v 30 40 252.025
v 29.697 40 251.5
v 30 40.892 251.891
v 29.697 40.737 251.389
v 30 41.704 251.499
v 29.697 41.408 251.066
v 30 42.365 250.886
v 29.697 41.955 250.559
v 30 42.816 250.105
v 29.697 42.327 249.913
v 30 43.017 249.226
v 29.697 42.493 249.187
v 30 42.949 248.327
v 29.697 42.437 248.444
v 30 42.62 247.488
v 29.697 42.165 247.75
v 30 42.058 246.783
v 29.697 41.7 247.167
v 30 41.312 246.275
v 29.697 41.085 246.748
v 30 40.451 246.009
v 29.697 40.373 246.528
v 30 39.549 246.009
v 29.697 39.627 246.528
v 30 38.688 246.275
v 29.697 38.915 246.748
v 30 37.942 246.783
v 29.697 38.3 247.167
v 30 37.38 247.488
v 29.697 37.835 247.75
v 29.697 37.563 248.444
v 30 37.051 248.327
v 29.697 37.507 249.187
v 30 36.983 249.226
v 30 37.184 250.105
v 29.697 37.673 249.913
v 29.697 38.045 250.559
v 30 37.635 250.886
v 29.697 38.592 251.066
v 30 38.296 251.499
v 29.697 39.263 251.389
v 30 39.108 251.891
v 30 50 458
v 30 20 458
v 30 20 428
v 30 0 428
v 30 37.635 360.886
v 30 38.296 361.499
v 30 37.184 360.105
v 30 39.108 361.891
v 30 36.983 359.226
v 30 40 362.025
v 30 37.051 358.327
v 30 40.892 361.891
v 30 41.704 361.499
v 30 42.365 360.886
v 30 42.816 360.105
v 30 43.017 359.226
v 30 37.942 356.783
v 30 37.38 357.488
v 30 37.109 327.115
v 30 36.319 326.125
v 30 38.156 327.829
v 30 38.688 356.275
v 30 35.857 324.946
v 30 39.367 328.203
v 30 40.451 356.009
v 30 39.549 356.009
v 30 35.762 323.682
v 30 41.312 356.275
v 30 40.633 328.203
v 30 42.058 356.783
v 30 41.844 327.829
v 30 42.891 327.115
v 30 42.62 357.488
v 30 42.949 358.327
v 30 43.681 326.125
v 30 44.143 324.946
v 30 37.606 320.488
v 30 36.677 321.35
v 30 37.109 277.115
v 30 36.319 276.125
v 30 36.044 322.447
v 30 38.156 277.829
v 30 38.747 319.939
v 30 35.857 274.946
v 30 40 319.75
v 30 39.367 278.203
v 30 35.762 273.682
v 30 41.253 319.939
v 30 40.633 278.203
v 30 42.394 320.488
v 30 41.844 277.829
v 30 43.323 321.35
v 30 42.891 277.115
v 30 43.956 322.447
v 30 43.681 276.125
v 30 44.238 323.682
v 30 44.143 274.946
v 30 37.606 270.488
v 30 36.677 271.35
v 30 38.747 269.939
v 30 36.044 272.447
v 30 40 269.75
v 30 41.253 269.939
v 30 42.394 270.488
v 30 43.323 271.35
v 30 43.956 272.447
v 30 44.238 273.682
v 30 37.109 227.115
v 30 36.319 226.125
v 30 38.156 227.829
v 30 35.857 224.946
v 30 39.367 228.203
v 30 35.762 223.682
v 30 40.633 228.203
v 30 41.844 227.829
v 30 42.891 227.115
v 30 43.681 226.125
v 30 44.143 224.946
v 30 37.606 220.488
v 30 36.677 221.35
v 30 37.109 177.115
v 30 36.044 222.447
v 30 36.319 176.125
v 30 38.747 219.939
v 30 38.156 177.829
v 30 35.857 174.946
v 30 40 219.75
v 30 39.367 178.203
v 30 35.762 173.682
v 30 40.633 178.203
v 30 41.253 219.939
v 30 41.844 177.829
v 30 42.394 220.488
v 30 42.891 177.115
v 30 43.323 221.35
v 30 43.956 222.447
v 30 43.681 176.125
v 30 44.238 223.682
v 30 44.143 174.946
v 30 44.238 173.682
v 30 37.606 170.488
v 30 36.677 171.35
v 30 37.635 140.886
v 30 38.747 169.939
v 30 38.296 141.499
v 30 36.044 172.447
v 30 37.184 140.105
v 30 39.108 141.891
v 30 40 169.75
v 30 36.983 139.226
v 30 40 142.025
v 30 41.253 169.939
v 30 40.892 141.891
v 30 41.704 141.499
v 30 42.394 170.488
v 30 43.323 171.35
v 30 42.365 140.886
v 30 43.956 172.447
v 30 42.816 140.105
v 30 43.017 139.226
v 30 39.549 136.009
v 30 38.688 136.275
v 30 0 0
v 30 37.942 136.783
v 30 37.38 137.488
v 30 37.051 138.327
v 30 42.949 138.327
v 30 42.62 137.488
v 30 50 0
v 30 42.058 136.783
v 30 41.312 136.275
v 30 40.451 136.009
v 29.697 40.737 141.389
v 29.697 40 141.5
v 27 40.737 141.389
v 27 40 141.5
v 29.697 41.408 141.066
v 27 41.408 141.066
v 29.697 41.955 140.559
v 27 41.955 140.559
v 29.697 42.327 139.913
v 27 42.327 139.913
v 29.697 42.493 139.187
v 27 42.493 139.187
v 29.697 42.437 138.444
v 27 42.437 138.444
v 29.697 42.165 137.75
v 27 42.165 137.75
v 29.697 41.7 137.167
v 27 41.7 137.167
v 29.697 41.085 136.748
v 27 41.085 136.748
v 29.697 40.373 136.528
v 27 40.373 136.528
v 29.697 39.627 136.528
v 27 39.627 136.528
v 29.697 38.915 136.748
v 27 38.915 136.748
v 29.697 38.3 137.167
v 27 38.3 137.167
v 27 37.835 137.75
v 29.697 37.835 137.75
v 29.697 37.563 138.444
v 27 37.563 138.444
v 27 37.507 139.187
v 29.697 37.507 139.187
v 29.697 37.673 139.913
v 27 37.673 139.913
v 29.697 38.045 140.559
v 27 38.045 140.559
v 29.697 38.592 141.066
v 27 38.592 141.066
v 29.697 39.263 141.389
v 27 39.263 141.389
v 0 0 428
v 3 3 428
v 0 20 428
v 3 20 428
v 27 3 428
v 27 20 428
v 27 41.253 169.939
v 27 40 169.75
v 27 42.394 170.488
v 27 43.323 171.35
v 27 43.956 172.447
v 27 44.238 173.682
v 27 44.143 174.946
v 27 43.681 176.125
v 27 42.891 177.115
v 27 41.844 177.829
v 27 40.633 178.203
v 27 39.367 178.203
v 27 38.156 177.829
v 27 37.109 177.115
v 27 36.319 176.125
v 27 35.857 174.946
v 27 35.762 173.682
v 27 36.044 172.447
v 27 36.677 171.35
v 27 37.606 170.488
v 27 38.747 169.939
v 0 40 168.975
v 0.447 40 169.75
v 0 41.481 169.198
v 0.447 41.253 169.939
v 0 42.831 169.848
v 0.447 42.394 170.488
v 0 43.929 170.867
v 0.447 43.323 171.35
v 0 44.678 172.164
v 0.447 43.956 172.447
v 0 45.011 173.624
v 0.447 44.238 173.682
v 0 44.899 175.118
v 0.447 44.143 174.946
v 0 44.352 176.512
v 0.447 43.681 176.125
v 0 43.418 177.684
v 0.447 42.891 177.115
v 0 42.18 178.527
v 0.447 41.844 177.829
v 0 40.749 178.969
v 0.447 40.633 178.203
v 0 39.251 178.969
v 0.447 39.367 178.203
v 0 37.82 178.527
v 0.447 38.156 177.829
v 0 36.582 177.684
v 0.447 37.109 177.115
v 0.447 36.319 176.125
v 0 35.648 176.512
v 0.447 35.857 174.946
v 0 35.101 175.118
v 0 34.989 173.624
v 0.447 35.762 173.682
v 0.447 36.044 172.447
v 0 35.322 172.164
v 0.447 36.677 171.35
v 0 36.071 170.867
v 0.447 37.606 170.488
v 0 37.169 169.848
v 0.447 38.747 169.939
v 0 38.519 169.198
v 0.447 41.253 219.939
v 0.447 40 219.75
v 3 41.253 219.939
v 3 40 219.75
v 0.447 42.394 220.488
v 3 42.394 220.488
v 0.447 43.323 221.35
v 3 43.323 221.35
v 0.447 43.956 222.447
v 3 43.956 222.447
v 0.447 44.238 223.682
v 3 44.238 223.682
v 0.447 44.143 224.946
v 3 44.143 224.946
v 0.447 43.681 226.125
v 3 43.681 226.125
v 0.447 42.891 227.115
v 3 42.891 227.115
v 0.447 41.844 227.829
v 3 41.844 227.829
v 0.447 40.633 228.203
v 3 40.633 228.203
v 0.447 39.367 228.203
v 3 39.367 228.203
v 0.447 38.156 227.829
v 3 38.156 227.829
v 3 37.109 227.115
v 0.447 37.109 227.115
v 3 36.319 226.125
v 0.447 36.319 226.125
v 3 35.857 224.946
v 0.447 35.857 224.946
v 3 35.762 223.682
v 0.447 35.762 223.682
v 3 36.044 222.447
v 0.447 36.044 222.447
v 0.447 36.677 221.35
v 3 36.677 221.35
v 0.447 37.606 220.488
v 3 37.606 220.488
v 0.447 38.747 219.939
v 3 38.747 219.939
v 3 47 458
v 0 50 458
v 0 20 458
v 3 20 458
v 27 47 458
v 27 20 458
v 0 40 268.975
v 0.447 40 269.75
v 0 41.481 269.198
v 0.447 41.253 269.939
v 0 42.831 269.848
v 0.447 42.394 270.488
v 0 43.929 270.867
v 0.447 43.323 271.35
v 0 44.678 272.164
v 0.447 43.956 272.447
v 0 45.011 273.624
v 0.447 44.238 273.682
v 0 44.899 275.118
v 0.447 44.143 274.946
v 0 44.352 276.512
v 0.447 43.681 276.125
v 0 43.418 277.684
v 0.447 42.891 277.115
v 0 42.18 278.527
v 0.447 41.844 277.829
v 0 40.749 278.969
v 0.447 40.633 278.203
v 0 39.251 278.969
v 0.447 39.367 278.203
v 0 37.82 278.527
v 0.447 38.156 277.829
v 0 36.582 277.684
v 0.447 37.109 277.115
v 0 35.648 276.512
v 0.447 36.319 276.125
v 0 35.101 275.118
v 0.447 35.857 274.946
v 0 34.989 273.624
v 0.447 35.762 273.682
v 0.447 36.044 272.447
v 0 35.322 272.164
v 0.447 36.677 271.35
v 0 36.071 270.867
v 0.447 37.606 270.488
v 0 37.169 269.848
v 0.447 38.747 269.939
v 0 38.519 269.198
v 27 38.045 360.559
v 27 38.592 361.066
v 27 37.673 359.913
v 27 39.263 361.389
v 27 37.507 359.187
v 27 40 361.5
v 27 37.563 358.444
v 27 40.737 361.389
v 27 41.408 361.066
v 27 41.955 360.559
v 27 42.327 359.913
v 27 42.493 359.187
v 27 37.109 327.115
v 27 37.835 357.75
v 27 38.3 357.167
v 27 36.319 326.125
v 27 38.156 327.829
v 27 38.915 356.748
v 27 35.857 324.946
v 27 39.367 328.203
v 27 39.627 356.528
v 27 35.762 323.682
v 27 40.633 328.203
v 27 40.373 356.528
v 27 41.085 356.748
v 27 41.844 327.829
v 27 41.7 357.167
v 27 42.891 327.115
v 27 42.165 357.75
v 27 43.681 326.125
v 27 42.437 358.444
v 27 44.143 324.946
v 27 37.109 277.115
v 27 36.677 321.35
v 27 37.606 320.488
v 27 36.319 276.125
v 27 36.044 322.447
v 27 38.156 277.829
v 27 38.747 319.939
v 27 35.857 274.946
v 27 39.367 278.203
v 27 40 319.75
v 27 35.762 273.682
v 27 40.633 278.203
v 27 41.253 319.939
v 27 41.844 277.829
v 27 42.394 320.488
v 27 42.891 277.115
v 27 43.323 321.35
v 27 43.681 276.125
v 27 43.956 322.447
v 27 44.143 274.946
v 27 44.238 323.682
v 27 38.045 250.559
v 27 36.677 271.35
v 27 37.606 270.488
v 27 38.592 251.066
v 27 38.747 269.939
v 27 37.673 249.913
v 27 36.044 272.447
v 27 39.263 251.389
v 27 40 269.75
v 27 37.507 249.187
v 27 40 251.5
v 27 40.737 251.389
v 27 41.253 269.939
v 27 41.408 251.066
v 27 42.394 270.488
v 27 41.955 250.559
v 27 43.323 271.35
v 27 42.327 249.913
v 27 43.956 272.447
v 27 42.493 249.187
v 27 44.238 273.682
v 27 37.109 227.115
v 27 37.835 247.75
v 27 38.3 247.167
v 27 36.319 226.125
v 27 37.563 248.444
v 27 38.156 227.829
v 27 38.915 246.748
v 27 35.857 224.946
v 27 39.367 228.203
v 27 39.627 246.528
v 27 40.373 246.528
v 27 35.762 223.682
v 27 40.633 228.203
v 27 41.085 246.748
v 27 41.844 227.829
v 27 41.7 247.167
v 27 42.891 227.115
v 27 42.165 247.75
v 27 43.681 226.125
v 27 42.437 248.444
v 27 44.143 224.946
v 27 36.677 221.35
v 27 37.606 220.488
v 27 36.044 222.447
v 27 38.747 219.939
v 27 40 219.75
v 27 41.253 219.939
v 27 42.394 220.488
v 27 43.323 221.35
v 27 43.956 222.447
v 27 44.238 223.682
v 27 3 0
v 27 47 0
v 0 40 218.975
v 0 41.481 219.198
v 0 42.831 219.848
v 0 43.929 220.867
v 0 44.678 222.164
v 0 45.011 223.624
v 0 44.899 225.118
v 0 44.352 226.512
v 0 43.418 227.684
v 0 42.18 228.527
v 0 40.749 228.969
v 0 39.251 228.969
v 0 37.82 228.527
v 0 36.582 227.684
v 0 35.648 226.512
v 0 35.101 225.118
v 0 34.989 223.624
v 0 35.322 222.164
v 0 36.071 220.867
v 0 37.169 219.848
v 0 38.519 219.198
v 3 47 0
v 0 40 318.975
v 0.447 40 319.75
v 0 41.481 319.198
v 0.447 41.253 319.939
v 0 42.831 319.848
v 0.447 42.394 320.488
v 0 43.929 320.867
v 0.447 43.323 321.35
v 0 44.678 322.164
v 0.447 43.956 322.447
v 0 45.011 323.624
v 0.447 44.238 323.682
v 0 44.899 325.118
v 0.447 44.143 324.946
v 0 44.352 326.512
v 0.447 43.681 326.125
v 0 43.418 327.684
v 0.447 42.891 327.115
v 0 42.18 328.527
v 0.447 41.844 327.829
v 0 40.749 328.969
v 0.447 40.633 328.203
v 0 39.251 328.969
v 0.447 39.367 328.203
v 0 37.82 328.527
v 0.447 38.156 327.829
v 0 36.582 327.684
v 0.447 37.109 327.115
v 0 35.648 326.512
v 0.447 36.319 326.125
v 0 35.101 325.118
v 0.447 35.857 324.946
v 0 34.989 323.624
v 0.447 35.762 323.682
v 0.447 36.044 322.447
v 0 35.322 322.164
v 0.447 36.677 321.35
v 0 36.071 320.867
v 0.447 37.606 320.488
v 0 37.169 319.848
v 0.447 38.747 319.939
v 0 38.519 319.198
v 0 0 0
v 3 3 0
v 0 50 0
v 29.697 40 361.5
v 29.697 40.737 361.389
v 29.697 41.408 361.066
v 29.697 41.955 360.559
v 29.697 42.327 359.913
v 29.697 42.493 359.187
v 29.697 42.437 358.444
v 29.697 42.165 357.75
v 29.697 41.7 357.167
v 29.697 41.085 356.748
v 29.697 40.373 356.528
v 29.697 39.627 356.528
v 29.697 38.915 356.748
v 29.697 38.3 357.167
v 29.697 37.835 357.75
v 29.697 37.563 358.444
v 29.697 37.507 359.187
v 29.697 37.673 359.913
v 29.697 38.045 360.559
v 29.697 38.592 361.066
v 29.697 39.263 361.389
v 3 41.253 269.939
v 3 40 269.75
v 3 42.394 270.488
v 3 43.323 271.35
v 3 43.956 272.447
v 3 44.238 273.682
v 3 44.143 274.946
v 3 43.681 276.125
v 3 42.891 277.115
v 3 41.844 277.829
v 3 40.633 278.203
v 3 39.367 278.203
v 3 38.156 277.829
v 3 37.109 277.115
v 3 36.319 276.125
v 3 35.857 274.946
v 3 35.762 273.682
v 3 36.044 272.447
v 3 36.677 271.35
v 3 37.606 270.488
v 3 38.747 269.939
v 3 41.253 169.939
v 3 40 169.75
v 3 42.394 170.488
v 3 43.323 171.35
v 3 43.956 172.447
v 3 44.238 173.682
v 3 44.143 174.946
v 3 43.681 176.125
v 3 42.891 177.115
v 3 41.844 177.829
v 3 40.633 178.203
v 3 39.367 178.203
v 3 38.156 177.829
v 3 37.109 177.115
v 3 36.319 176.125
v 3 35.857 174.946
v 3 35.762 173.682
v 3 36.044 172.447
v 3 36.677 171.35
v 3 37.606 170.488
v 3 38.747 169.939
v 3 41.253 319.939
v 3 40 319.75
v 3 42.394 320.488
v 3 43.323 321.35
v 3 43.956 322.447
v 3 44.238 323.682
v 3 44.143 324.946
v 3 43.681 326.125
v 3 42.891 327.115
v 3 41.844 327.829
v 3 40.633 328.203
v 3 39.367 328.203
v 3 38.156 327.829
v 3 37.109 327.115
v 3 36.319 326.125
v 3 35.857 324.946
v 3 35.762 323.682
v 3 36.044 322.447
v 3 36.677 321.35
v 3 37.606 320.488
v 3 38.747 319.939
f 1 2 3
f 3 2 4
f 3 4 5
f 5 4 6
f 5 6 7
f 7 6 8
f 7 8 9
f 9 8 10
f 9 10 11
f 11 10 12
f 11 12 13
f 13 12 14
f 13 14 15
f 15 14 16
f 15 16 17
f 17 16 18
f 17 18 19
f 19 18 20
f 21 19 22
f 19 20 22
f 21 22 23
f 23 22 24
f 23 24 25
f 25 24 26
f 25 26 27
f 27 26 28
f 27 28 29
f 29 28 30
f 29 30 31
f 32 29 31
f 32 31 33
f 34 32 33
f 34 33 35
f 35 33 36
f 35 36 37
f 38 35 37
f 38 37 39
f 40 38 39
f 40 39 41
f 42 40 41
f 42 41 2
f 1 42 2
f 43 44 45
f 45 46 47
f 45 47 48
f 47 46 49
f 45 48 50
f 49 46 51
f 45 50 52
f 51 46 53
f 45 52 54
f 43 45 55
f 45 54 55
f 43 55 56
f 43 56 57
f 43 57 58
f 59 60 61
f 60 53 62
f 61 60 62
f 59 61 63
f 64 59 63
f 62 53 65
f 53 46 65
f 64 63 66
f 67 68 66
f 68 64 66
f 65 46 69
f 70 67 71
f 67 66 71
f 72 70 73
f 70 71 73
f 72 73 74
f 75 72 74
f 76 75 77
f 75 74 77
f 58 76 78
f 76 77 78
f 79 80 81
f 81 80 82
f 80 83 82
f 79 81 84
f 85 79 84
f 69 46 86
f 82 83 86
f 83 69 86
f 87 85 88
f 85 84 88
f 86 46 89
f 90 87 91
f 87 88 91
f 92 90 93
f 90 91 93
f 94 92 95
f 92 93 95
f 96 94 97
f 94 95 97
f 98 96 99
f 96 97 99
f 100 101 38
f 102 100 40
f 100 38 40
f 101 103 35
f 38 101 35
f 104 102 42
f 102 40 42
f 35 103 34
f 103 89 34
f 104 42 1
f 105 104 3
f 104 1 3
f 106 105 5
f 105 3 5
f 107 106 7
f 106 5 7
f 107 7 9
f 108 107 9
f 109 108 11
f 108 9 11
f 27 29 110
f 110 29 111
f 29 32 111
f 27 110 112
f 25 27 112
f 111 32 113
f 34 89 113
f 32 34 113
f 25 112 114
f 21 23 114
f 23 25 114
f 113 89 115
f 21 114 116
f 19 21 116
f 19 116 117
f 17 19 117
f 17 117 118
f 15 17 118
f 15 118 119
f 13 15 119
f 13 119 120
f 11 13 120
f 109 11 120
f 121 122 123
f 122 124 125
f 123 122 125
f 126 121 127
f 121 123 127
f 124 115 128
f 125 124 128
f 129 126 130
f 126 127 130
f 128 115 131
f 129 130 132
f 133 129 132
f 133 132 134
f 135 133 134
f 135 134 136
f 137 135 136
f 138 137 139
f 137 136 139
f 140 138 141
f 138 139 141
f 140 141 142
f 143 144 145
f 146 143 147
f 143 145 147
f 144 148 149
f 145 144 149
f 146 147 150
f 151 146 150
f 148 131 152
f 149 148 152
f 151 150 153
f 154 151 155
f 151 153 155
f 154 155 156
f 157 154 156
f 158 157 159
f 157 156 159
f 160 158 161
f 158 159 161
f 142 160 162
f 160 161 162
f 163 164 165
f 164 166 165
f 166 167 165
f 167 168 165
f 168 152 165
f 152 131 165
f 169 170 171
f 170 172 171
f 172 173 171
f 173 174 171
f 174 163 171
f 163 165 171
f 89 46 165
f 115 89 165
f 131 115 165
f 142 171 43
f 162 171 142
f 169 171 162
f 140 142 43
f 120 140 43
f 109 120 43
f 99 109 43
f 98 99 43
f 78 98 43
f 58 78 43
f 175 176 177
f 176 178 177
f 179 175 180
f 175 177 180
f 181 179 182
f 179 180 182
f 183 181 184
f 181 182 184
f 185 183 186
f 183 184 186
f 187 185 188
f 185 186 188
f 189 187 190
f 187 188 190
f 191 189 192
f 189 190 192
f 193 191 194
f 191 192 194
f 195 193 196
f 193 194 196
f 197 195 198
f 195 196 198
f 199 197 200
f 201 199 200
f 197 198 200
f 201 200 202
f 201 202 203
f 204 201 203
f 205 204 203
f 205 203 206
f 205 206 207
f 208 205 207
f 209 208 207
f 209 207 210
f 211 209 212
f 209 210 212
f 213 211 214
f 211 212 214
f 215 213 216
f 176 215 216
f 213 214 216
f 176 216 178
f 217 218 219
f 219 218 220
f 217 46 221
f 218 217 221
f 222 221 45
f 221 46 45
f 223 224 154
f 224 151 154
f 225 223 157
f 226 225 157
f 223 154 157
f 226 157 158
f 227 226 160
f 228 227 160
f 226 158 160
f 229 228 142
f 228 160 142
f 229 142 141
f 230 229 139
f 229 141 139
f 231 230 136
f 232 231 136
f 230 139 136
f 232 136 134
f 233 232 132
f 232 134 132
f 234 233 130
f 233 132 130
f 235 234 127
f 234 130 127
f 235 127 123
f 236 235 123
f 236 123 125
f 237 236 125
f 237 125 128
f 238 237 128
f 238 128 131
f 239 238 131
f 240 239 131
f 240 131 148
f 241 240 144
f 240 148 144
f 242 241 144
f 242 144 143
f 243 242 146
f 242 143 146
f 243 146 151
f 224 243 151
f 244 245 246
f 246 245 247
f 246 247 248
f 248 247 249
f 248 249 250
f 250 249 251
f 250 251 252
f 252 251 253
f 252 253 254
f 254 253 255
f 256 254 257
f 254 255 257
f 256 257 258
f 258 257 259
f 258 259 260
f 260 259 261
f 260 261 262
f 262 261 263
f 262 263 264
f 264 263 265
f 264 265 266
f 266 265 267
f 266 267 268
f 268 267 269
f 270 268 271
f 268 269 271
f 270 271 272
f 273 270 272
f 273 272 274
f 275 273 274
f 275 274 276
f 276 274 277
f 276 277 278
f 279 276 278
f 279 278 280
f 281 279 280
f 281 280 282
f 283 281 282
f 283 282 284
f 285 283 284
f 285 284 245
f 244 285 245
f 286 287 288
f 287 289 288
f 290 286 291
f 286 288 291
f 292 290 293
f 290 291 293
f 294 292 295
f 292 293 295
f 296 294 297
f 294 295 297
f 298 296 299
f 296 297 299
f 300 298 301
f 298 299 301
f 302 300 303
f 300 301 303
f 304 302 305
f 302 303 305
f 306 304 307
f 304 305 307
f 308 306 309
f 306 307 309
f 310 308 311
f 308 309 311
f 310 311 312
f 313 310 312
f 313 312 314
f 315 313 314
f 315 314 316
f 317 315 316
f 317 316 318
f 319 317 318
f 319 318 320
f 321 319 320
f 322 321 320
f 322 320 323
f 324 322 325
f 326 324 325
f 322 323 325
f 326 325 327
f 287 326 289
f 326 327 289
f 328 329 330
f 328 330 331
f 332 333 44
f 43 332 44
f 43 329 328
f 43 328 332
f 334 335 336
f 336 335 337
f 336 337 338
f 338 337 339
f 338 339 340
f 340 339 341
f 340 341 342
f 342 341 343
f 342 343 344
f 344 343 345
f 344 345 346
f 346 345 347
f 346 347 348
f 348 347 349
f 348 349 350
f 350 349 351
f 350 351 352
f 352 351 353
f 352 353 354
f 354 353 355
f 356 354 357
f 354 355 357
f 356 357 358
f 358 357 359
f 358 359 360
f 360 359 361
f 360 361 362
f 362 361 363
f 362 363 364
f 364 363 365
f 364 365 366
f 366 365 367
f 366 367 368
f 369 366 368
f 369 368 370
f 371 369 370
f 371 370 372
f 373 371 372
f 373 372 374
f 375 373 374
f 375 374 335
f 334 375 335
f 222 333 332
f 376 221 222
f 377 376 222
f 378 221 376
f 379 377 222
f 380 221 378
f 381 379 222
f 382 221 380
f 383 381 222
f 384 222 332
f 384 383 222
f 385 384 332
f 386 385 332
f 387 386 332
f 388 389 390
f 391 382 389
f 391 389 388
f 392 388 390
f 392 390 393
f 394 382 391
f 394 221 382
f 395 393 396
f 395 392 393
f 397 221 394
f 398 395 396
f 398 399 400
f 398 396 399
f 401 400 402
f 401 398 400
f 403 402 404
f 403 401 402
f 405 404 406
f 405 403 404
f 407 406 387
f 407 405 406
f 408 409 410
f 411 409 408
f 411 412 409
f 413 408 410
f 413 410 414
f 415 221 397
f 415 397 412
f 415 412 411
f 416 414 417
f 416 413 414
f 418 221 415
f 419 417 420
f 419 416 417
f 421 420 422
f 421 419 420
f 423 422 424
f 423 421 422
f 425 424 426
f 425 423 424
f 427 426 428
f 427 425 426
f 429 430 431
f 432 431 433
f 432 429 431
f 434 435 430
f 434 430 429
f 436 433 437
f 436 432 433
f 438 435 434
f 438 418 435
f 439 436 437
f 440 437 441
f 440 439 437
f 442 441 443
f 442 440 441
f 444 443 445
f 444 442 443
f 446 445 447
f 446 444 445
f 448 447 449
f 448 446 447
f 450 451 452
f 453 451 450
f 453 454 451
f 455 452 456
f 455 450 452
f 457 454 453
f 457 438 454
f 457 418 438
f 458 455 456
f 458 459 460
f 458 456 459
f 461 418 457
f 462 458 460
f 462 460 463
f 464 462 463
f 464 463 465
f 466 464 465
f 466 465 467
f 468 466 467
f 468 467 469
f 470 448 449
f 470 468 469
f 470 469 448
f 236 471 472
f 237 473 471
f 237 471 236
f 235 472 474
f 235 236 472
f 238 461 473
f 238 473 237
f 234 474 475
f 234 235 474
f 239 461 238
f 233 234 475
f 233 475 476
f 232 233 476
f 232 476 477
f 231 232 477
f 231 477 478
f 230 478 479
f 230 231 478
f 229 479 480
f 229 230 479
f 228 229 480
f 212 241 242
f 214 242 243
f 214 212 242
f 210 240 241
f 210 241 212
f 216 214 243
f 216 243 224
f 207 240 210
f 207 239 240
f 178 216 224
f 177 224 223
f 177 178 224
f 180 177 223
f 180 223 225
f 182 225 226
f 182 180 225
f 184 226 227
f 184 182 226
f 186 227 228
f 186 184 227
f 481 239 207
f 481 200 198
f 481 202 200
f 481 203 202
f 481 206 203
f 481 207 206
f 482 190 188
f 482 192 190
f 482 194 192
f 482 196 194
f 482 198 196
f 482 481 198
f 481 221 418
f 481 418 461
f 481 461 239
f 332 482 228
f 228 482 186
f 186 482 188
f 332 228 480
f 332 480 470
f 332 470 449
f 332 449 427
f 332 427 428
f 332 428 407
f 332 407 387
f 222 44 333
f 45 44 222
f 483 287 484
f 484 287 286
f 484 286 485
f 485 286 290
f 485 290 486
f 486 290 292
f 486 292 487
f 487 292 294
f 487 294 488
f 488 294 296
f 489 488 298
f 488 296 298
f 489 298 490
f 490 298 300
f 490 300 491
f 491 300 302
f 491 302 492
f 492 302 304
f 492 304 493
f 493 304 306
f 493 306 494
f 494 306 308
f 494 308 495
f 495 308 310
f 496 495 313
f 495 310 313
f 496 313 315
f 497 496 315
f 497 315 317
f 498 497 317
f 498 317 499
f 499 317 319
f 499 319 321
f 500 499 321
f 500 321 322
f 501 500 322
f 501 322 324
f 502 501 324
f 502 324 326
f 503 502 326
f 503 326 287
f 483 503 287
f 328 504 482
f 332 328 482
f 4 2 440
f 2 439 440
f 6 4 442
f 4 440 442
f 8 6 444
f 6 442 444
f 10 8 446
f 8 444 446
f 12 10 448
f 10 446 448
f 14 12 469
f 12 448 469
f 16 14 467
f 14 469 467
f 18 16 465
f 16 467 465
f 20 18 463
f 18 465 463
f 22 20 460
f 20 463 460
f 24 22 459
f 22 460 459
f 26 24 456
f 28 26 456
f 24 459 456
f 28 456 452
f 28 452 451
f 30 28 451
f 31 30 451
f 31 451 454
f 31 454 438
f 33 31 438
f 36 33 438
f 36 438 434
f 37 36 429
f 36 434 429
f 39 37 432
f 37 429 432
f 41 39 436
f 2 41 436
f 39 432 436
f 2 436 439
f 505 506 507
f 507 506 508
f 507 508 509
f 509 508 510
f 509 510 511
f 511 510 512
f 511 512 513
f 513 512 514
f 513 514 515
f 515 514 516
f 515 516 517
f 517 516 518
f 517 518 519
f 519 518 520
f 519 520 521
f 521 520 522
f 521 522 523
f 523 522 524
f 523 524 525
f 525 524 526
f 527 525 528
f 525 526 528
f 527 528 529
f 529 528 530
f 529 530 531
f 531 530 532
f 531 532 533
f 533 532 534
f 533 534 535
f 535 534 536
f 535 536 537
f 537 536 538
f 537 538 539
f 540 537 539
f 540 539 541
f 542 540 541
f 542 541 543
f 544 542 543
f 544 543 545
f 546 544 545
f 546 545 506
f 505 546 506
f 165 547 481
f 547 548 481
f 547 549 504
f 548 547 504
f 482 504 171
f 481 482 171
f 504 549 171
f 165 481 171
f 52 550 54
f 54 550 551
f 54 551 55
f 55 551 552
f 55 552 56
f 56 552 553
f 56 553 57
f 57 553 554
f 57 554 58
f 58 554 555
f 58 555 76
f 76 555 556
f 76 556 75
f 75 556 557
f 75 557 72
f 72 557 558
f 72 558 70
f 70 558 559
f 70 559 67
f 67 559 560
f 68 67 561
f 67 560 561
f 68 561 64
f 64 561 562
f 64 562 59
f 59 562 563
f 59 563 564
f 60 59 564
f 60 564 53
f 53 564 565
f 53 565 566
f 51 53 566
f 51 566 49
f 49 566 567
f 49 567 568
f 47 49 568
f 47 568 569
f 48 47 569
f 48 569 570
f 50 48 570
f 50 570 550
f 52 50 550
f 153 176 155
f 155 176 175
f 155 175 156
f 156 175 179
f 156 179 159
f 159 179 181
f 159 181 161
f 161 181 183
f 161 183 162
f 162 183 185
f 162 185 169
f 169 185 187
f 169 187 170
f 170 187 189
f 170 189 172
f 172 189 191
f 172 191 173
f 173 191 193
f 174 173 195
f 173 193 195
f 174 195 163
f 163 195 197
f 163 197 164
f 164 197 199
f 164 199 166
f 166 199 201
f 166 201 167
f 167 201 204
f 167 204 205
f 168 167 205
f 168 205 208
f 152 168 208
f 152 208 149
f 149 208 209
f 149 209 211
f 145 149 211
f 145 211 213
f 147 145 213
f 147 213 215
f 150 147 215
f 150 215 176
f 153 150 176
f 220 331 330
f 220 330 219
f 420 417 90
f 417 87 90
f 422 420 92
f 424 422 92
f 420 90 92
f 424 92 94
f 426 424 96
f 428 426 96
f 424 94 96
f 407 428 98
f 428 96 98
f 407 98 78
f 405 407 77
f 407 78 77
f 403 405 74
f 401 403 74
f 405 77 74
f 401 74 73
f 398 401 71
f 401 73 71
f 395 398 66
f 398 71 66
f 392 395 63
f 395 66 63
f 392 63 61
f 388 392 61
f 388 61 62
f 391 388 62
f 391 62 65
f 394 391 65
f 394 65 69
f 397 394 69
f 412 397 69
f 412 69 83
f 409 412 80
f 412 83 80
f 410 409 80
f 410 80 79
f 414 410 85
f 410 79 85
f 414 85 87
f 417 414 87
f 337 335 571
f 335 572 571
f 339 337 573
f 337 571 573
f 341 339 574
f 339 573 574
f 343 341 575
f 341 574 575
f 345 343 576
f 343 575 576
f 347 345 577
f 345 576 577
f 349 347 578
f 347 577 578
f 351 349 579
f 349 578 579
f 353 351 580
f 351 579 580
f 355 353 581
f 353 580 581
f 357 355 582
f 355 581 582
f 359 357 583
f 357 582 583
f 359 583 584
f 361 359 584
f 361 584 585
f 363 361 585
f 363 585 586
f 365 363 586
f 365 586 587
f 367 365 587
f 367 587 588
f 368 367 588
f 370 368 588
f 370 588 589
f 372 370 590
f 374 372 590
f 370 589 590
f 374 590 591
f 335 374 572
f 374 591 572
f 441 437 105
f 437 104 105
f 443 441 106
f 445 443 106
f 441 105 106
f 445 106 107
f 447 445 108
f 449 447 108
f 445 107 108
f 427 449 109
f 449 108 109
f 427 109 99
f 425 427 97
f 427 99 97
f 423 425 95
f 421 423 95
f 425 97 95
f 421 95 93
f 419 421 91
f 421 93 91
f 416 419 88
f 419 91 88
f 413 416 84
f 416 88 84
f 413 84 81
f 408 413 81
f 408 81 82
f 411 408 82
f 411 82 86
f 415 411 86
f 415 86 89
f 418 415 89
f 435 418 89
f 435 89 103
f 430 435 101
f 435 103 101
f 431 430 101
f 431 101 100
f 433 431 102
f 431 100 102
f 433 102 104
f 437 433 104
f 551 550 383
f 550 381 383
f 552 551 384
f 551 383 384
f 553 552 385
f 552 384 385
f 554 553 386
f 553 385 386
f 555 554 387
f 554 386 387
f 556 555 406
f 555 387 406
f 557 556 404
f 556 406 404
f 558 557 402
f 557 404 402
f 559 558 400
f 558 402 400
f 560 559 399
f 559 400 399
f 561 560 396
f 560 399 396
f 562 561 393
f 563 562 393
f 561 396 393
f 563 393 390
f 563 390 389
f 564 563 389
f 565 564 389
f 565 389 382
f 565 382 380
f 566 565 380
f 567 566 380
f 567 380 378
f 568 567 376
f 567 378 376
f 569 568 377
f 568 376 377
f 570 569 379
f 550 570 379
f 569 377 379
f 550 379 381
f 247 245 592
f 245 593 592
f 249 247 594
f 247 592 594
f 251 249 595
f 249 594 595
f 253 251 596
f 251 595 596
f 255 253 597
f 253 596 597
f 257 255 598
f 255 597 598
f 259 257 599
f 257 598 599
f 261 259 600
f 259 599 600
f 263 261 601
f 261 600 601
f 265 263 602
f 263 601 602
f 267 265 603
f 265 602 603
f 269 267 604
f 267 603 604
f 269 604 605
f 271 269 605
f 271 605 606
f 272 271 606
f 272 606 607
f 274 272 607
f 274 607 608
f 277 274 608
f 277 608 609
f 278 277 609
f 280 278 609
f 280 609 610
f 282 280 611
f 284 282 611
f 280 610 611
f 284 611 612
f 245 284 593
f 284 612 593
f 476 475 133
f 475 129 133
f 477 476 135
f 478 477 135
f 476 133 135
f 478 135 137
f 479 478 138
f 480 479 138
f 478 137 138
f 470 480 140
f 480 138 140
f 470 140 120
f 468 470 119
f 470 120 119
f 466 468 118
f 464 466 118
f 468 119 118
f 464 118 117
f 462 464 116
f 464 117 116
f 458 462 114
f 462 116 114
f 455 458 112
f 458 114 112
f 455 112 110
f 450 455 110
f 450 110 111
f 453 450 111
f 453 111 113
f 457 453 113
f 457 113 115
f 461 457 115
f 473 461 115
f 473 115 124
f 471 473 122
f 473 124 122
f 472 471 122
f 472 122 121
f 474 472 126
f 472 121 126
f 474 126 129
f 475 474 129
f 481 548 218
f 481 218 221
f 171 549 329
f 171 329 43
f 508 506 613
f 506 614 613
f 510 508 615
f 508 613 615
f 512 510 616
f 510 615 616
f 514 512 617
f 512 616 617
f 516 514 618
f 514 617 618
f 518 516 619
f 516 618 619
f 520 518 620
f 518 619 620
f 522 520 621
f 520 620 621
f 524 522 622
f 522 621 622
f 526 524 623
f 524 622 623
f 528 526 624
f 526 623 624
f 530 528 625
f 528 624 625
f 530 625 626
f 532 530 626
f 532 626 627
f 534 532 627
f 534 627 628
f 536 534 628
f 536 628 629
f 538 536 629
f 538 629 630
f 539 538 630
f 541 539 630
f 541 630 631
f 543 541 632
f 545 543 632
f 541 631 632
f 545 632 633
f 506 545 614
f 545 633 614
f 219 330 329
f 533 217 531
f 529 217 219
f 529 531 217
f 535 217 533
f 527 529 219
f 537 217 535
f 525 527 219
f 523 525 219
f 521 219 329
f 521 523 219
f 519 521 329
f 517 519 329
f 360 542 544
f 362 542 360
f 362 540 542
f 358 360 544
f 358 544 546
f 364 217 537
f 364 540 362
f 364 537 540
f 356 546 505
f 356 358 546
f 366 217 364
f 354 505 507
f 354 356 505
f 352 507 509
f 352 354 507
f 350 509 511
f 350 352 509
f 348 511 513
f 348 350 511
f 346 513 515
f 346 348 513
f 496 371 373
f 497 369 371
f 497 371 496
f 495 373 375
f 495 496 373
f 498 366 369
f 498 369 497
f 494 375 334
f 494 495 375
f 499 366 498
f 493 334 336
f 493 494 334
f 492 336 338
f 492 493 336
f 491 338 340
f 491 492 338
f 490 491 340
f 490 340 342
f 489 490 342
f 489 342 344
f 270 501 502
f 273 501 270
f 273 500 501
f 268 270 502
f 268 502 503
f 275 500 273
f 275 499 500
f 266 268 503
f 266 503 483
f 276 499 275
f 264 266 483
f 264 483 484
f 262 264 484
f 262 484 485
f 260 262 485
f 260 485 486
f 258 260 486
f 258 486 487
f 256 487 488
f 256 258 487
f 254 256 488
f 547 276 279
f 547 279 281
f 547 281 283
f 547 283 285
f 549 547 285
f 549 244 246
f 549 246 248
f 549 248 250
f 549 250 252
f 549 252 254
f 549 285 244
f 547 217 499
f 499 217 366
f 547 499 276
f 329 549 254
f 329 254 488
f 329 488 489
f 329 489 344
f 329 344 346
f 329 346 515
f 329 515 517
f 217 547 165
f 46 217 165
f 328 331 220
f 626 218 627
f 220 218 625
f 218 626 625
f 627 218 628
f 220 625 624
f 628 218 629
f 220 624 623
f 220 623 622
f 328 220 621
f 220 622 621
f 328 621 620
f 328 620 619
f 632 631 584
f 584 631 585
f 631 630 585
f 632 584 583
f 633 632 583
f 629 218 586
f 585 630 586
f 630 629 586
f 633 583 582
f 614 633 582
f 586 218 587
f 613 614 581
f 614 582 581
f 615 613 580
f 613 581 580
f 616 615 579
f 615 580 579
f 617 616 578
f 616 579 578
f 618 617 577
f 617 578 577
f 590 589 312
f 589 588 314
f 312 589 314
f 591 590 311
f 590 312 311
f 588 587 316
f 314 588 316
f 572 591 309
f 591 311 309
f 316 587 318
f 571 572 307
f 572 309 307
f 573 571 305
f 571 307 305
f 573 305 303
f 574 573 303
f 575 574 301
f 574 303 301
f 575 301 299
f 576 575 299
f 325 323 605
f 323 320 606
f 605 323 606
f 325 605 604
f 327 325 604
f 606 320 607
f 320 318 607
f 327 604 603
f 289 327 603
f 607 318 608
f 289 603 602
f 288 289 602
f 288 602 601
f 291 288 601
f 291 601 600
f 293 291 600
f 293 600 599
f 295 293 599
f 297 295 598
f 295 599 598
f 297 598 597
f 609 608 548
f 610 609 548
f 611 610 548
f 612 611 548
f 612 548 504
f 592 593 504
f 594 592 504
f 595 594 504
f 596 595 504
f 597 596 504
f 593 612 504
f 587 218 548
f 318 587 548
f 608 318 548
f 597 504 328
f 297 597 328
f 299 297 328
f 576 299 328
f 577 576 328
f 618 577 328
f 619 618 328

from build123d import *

# Parameters (mm, degrees)
SKETCH_1_W                   = 30
SKETCH_1_H                   = 50
SKETCH_1_W_2                 = 24
SKETCH_1_H_2                 = 44
EXTRUDE_1_DEPTH              = 458
SKETCH_2_W                   = 30
SKETCH_2_H                   = 20
CUT_EXTRUDE_1_DEPTH          = 462.696870251
HOLE_WIZARD_M61_D            = 5
HOLE_WIZARD_M61_DEPTH        = 17
HOLE_WIZARD_M61_CSINK_D      = 6.05
HOLE_WIZARD_M61_CSINK_ANGLE  = 120
HOLE_WIZARD_M61_TIP          = 1.502151548
HOLE_WIZARD_M101_D           = 8.5
HOLE_WIZARD_M101_DEPTH       = 47.5
HOLE_WIZARD_M101_CSINK_D     = 10.05
HOLE_WIZARD_M101_CSINK_ANGLE = 120
HOLE_WIZARD_M101_TIP         = 2.553657631


with BuildPart() as part:
    # Эскиз1 → Вытянуть-Тонкостенный1 (new body)
    with BuildSketch(Plane.XY):
        with Locations((15, 25)):
            Rectangle(SKETCH_1_W, SKETCH_1_H)
        with Locations((15, 25)):
            Rectangle(SKETCH_1_W_2, SKETCH_1_H_2, mode=Mode.SUBTRACT)
    extrude(amount=EXTRUDE_1_DEPTH)

    # Эскиз2 → Вырез-Вытянуть1 (cut, through all)
    with BuildSketch(Plane(origin=(30, 0, 0), x_dir=(0, 0, -1), z_dir=(1, 0, 0))):
        with Locations((-443, 10)):
            Rectangle(SKETCH_2_W, SKETCH_2_H)
    extrude(amount=-CUT_EXTRUDE_1_DEPTH, mode=Mode.SUBTRACT)

    # Отверстие обработанное метчиком M61
    with Locations(Plane(origin=(30, 0, 0), x_dir=(0, 0, -1), z_dir=(1, 0, 0))):
        with Locations((-249, 40), (-359, 40), (-139, 40)):
            CounterSinkHole(HOLE_WIZARD_M61_D / 2, HOLE_WIZARD_M61_CSINK_D / 2, depth=HOLE_WIZARD_M61_DEPTH, counter_sink_angle=HOLE_WIZARD_M61_CSINK_ANGLE)
            with Locations((0, 0, -(HOLE_WIZARD_M61_DEPTH + HOLE_WIZARD_M61_TIP / 2))):  # 118° drill point
                Cone(0, HOLE_WIZARD_M61_D / 2, HOLE_WIZARD_M61_TIP, mode=Mode.SUBTRACT)

    # Отверстие обработанное метчиком M101
    with Locations(Plane.ZY):
        with Locations((224, 40), (174, 40), (324, 40), (274, 40)):
            CounterSinkHole(HOLE_WIZARD_M101_D / 2, HOLE_WIZARD_M101_CSINK_D / 2, depth=HOLE_WIZARD_M101_DEPTH, counter_sink_angle=HOLE_WIZARD_M101_CSINK_ANGLE)
            with Locations((0, 0, -(HOLE_WIZARD_M101_DEPTH + HOLE_WIZARD_M101_TIP / 2))):  # 118° drill point
                Cone(0, HOLE_WIZARD_M101_D / 2, HOLE_WIZARD_M101_TIP, mode=Mode.SUBTRACT)


solid = part.part
